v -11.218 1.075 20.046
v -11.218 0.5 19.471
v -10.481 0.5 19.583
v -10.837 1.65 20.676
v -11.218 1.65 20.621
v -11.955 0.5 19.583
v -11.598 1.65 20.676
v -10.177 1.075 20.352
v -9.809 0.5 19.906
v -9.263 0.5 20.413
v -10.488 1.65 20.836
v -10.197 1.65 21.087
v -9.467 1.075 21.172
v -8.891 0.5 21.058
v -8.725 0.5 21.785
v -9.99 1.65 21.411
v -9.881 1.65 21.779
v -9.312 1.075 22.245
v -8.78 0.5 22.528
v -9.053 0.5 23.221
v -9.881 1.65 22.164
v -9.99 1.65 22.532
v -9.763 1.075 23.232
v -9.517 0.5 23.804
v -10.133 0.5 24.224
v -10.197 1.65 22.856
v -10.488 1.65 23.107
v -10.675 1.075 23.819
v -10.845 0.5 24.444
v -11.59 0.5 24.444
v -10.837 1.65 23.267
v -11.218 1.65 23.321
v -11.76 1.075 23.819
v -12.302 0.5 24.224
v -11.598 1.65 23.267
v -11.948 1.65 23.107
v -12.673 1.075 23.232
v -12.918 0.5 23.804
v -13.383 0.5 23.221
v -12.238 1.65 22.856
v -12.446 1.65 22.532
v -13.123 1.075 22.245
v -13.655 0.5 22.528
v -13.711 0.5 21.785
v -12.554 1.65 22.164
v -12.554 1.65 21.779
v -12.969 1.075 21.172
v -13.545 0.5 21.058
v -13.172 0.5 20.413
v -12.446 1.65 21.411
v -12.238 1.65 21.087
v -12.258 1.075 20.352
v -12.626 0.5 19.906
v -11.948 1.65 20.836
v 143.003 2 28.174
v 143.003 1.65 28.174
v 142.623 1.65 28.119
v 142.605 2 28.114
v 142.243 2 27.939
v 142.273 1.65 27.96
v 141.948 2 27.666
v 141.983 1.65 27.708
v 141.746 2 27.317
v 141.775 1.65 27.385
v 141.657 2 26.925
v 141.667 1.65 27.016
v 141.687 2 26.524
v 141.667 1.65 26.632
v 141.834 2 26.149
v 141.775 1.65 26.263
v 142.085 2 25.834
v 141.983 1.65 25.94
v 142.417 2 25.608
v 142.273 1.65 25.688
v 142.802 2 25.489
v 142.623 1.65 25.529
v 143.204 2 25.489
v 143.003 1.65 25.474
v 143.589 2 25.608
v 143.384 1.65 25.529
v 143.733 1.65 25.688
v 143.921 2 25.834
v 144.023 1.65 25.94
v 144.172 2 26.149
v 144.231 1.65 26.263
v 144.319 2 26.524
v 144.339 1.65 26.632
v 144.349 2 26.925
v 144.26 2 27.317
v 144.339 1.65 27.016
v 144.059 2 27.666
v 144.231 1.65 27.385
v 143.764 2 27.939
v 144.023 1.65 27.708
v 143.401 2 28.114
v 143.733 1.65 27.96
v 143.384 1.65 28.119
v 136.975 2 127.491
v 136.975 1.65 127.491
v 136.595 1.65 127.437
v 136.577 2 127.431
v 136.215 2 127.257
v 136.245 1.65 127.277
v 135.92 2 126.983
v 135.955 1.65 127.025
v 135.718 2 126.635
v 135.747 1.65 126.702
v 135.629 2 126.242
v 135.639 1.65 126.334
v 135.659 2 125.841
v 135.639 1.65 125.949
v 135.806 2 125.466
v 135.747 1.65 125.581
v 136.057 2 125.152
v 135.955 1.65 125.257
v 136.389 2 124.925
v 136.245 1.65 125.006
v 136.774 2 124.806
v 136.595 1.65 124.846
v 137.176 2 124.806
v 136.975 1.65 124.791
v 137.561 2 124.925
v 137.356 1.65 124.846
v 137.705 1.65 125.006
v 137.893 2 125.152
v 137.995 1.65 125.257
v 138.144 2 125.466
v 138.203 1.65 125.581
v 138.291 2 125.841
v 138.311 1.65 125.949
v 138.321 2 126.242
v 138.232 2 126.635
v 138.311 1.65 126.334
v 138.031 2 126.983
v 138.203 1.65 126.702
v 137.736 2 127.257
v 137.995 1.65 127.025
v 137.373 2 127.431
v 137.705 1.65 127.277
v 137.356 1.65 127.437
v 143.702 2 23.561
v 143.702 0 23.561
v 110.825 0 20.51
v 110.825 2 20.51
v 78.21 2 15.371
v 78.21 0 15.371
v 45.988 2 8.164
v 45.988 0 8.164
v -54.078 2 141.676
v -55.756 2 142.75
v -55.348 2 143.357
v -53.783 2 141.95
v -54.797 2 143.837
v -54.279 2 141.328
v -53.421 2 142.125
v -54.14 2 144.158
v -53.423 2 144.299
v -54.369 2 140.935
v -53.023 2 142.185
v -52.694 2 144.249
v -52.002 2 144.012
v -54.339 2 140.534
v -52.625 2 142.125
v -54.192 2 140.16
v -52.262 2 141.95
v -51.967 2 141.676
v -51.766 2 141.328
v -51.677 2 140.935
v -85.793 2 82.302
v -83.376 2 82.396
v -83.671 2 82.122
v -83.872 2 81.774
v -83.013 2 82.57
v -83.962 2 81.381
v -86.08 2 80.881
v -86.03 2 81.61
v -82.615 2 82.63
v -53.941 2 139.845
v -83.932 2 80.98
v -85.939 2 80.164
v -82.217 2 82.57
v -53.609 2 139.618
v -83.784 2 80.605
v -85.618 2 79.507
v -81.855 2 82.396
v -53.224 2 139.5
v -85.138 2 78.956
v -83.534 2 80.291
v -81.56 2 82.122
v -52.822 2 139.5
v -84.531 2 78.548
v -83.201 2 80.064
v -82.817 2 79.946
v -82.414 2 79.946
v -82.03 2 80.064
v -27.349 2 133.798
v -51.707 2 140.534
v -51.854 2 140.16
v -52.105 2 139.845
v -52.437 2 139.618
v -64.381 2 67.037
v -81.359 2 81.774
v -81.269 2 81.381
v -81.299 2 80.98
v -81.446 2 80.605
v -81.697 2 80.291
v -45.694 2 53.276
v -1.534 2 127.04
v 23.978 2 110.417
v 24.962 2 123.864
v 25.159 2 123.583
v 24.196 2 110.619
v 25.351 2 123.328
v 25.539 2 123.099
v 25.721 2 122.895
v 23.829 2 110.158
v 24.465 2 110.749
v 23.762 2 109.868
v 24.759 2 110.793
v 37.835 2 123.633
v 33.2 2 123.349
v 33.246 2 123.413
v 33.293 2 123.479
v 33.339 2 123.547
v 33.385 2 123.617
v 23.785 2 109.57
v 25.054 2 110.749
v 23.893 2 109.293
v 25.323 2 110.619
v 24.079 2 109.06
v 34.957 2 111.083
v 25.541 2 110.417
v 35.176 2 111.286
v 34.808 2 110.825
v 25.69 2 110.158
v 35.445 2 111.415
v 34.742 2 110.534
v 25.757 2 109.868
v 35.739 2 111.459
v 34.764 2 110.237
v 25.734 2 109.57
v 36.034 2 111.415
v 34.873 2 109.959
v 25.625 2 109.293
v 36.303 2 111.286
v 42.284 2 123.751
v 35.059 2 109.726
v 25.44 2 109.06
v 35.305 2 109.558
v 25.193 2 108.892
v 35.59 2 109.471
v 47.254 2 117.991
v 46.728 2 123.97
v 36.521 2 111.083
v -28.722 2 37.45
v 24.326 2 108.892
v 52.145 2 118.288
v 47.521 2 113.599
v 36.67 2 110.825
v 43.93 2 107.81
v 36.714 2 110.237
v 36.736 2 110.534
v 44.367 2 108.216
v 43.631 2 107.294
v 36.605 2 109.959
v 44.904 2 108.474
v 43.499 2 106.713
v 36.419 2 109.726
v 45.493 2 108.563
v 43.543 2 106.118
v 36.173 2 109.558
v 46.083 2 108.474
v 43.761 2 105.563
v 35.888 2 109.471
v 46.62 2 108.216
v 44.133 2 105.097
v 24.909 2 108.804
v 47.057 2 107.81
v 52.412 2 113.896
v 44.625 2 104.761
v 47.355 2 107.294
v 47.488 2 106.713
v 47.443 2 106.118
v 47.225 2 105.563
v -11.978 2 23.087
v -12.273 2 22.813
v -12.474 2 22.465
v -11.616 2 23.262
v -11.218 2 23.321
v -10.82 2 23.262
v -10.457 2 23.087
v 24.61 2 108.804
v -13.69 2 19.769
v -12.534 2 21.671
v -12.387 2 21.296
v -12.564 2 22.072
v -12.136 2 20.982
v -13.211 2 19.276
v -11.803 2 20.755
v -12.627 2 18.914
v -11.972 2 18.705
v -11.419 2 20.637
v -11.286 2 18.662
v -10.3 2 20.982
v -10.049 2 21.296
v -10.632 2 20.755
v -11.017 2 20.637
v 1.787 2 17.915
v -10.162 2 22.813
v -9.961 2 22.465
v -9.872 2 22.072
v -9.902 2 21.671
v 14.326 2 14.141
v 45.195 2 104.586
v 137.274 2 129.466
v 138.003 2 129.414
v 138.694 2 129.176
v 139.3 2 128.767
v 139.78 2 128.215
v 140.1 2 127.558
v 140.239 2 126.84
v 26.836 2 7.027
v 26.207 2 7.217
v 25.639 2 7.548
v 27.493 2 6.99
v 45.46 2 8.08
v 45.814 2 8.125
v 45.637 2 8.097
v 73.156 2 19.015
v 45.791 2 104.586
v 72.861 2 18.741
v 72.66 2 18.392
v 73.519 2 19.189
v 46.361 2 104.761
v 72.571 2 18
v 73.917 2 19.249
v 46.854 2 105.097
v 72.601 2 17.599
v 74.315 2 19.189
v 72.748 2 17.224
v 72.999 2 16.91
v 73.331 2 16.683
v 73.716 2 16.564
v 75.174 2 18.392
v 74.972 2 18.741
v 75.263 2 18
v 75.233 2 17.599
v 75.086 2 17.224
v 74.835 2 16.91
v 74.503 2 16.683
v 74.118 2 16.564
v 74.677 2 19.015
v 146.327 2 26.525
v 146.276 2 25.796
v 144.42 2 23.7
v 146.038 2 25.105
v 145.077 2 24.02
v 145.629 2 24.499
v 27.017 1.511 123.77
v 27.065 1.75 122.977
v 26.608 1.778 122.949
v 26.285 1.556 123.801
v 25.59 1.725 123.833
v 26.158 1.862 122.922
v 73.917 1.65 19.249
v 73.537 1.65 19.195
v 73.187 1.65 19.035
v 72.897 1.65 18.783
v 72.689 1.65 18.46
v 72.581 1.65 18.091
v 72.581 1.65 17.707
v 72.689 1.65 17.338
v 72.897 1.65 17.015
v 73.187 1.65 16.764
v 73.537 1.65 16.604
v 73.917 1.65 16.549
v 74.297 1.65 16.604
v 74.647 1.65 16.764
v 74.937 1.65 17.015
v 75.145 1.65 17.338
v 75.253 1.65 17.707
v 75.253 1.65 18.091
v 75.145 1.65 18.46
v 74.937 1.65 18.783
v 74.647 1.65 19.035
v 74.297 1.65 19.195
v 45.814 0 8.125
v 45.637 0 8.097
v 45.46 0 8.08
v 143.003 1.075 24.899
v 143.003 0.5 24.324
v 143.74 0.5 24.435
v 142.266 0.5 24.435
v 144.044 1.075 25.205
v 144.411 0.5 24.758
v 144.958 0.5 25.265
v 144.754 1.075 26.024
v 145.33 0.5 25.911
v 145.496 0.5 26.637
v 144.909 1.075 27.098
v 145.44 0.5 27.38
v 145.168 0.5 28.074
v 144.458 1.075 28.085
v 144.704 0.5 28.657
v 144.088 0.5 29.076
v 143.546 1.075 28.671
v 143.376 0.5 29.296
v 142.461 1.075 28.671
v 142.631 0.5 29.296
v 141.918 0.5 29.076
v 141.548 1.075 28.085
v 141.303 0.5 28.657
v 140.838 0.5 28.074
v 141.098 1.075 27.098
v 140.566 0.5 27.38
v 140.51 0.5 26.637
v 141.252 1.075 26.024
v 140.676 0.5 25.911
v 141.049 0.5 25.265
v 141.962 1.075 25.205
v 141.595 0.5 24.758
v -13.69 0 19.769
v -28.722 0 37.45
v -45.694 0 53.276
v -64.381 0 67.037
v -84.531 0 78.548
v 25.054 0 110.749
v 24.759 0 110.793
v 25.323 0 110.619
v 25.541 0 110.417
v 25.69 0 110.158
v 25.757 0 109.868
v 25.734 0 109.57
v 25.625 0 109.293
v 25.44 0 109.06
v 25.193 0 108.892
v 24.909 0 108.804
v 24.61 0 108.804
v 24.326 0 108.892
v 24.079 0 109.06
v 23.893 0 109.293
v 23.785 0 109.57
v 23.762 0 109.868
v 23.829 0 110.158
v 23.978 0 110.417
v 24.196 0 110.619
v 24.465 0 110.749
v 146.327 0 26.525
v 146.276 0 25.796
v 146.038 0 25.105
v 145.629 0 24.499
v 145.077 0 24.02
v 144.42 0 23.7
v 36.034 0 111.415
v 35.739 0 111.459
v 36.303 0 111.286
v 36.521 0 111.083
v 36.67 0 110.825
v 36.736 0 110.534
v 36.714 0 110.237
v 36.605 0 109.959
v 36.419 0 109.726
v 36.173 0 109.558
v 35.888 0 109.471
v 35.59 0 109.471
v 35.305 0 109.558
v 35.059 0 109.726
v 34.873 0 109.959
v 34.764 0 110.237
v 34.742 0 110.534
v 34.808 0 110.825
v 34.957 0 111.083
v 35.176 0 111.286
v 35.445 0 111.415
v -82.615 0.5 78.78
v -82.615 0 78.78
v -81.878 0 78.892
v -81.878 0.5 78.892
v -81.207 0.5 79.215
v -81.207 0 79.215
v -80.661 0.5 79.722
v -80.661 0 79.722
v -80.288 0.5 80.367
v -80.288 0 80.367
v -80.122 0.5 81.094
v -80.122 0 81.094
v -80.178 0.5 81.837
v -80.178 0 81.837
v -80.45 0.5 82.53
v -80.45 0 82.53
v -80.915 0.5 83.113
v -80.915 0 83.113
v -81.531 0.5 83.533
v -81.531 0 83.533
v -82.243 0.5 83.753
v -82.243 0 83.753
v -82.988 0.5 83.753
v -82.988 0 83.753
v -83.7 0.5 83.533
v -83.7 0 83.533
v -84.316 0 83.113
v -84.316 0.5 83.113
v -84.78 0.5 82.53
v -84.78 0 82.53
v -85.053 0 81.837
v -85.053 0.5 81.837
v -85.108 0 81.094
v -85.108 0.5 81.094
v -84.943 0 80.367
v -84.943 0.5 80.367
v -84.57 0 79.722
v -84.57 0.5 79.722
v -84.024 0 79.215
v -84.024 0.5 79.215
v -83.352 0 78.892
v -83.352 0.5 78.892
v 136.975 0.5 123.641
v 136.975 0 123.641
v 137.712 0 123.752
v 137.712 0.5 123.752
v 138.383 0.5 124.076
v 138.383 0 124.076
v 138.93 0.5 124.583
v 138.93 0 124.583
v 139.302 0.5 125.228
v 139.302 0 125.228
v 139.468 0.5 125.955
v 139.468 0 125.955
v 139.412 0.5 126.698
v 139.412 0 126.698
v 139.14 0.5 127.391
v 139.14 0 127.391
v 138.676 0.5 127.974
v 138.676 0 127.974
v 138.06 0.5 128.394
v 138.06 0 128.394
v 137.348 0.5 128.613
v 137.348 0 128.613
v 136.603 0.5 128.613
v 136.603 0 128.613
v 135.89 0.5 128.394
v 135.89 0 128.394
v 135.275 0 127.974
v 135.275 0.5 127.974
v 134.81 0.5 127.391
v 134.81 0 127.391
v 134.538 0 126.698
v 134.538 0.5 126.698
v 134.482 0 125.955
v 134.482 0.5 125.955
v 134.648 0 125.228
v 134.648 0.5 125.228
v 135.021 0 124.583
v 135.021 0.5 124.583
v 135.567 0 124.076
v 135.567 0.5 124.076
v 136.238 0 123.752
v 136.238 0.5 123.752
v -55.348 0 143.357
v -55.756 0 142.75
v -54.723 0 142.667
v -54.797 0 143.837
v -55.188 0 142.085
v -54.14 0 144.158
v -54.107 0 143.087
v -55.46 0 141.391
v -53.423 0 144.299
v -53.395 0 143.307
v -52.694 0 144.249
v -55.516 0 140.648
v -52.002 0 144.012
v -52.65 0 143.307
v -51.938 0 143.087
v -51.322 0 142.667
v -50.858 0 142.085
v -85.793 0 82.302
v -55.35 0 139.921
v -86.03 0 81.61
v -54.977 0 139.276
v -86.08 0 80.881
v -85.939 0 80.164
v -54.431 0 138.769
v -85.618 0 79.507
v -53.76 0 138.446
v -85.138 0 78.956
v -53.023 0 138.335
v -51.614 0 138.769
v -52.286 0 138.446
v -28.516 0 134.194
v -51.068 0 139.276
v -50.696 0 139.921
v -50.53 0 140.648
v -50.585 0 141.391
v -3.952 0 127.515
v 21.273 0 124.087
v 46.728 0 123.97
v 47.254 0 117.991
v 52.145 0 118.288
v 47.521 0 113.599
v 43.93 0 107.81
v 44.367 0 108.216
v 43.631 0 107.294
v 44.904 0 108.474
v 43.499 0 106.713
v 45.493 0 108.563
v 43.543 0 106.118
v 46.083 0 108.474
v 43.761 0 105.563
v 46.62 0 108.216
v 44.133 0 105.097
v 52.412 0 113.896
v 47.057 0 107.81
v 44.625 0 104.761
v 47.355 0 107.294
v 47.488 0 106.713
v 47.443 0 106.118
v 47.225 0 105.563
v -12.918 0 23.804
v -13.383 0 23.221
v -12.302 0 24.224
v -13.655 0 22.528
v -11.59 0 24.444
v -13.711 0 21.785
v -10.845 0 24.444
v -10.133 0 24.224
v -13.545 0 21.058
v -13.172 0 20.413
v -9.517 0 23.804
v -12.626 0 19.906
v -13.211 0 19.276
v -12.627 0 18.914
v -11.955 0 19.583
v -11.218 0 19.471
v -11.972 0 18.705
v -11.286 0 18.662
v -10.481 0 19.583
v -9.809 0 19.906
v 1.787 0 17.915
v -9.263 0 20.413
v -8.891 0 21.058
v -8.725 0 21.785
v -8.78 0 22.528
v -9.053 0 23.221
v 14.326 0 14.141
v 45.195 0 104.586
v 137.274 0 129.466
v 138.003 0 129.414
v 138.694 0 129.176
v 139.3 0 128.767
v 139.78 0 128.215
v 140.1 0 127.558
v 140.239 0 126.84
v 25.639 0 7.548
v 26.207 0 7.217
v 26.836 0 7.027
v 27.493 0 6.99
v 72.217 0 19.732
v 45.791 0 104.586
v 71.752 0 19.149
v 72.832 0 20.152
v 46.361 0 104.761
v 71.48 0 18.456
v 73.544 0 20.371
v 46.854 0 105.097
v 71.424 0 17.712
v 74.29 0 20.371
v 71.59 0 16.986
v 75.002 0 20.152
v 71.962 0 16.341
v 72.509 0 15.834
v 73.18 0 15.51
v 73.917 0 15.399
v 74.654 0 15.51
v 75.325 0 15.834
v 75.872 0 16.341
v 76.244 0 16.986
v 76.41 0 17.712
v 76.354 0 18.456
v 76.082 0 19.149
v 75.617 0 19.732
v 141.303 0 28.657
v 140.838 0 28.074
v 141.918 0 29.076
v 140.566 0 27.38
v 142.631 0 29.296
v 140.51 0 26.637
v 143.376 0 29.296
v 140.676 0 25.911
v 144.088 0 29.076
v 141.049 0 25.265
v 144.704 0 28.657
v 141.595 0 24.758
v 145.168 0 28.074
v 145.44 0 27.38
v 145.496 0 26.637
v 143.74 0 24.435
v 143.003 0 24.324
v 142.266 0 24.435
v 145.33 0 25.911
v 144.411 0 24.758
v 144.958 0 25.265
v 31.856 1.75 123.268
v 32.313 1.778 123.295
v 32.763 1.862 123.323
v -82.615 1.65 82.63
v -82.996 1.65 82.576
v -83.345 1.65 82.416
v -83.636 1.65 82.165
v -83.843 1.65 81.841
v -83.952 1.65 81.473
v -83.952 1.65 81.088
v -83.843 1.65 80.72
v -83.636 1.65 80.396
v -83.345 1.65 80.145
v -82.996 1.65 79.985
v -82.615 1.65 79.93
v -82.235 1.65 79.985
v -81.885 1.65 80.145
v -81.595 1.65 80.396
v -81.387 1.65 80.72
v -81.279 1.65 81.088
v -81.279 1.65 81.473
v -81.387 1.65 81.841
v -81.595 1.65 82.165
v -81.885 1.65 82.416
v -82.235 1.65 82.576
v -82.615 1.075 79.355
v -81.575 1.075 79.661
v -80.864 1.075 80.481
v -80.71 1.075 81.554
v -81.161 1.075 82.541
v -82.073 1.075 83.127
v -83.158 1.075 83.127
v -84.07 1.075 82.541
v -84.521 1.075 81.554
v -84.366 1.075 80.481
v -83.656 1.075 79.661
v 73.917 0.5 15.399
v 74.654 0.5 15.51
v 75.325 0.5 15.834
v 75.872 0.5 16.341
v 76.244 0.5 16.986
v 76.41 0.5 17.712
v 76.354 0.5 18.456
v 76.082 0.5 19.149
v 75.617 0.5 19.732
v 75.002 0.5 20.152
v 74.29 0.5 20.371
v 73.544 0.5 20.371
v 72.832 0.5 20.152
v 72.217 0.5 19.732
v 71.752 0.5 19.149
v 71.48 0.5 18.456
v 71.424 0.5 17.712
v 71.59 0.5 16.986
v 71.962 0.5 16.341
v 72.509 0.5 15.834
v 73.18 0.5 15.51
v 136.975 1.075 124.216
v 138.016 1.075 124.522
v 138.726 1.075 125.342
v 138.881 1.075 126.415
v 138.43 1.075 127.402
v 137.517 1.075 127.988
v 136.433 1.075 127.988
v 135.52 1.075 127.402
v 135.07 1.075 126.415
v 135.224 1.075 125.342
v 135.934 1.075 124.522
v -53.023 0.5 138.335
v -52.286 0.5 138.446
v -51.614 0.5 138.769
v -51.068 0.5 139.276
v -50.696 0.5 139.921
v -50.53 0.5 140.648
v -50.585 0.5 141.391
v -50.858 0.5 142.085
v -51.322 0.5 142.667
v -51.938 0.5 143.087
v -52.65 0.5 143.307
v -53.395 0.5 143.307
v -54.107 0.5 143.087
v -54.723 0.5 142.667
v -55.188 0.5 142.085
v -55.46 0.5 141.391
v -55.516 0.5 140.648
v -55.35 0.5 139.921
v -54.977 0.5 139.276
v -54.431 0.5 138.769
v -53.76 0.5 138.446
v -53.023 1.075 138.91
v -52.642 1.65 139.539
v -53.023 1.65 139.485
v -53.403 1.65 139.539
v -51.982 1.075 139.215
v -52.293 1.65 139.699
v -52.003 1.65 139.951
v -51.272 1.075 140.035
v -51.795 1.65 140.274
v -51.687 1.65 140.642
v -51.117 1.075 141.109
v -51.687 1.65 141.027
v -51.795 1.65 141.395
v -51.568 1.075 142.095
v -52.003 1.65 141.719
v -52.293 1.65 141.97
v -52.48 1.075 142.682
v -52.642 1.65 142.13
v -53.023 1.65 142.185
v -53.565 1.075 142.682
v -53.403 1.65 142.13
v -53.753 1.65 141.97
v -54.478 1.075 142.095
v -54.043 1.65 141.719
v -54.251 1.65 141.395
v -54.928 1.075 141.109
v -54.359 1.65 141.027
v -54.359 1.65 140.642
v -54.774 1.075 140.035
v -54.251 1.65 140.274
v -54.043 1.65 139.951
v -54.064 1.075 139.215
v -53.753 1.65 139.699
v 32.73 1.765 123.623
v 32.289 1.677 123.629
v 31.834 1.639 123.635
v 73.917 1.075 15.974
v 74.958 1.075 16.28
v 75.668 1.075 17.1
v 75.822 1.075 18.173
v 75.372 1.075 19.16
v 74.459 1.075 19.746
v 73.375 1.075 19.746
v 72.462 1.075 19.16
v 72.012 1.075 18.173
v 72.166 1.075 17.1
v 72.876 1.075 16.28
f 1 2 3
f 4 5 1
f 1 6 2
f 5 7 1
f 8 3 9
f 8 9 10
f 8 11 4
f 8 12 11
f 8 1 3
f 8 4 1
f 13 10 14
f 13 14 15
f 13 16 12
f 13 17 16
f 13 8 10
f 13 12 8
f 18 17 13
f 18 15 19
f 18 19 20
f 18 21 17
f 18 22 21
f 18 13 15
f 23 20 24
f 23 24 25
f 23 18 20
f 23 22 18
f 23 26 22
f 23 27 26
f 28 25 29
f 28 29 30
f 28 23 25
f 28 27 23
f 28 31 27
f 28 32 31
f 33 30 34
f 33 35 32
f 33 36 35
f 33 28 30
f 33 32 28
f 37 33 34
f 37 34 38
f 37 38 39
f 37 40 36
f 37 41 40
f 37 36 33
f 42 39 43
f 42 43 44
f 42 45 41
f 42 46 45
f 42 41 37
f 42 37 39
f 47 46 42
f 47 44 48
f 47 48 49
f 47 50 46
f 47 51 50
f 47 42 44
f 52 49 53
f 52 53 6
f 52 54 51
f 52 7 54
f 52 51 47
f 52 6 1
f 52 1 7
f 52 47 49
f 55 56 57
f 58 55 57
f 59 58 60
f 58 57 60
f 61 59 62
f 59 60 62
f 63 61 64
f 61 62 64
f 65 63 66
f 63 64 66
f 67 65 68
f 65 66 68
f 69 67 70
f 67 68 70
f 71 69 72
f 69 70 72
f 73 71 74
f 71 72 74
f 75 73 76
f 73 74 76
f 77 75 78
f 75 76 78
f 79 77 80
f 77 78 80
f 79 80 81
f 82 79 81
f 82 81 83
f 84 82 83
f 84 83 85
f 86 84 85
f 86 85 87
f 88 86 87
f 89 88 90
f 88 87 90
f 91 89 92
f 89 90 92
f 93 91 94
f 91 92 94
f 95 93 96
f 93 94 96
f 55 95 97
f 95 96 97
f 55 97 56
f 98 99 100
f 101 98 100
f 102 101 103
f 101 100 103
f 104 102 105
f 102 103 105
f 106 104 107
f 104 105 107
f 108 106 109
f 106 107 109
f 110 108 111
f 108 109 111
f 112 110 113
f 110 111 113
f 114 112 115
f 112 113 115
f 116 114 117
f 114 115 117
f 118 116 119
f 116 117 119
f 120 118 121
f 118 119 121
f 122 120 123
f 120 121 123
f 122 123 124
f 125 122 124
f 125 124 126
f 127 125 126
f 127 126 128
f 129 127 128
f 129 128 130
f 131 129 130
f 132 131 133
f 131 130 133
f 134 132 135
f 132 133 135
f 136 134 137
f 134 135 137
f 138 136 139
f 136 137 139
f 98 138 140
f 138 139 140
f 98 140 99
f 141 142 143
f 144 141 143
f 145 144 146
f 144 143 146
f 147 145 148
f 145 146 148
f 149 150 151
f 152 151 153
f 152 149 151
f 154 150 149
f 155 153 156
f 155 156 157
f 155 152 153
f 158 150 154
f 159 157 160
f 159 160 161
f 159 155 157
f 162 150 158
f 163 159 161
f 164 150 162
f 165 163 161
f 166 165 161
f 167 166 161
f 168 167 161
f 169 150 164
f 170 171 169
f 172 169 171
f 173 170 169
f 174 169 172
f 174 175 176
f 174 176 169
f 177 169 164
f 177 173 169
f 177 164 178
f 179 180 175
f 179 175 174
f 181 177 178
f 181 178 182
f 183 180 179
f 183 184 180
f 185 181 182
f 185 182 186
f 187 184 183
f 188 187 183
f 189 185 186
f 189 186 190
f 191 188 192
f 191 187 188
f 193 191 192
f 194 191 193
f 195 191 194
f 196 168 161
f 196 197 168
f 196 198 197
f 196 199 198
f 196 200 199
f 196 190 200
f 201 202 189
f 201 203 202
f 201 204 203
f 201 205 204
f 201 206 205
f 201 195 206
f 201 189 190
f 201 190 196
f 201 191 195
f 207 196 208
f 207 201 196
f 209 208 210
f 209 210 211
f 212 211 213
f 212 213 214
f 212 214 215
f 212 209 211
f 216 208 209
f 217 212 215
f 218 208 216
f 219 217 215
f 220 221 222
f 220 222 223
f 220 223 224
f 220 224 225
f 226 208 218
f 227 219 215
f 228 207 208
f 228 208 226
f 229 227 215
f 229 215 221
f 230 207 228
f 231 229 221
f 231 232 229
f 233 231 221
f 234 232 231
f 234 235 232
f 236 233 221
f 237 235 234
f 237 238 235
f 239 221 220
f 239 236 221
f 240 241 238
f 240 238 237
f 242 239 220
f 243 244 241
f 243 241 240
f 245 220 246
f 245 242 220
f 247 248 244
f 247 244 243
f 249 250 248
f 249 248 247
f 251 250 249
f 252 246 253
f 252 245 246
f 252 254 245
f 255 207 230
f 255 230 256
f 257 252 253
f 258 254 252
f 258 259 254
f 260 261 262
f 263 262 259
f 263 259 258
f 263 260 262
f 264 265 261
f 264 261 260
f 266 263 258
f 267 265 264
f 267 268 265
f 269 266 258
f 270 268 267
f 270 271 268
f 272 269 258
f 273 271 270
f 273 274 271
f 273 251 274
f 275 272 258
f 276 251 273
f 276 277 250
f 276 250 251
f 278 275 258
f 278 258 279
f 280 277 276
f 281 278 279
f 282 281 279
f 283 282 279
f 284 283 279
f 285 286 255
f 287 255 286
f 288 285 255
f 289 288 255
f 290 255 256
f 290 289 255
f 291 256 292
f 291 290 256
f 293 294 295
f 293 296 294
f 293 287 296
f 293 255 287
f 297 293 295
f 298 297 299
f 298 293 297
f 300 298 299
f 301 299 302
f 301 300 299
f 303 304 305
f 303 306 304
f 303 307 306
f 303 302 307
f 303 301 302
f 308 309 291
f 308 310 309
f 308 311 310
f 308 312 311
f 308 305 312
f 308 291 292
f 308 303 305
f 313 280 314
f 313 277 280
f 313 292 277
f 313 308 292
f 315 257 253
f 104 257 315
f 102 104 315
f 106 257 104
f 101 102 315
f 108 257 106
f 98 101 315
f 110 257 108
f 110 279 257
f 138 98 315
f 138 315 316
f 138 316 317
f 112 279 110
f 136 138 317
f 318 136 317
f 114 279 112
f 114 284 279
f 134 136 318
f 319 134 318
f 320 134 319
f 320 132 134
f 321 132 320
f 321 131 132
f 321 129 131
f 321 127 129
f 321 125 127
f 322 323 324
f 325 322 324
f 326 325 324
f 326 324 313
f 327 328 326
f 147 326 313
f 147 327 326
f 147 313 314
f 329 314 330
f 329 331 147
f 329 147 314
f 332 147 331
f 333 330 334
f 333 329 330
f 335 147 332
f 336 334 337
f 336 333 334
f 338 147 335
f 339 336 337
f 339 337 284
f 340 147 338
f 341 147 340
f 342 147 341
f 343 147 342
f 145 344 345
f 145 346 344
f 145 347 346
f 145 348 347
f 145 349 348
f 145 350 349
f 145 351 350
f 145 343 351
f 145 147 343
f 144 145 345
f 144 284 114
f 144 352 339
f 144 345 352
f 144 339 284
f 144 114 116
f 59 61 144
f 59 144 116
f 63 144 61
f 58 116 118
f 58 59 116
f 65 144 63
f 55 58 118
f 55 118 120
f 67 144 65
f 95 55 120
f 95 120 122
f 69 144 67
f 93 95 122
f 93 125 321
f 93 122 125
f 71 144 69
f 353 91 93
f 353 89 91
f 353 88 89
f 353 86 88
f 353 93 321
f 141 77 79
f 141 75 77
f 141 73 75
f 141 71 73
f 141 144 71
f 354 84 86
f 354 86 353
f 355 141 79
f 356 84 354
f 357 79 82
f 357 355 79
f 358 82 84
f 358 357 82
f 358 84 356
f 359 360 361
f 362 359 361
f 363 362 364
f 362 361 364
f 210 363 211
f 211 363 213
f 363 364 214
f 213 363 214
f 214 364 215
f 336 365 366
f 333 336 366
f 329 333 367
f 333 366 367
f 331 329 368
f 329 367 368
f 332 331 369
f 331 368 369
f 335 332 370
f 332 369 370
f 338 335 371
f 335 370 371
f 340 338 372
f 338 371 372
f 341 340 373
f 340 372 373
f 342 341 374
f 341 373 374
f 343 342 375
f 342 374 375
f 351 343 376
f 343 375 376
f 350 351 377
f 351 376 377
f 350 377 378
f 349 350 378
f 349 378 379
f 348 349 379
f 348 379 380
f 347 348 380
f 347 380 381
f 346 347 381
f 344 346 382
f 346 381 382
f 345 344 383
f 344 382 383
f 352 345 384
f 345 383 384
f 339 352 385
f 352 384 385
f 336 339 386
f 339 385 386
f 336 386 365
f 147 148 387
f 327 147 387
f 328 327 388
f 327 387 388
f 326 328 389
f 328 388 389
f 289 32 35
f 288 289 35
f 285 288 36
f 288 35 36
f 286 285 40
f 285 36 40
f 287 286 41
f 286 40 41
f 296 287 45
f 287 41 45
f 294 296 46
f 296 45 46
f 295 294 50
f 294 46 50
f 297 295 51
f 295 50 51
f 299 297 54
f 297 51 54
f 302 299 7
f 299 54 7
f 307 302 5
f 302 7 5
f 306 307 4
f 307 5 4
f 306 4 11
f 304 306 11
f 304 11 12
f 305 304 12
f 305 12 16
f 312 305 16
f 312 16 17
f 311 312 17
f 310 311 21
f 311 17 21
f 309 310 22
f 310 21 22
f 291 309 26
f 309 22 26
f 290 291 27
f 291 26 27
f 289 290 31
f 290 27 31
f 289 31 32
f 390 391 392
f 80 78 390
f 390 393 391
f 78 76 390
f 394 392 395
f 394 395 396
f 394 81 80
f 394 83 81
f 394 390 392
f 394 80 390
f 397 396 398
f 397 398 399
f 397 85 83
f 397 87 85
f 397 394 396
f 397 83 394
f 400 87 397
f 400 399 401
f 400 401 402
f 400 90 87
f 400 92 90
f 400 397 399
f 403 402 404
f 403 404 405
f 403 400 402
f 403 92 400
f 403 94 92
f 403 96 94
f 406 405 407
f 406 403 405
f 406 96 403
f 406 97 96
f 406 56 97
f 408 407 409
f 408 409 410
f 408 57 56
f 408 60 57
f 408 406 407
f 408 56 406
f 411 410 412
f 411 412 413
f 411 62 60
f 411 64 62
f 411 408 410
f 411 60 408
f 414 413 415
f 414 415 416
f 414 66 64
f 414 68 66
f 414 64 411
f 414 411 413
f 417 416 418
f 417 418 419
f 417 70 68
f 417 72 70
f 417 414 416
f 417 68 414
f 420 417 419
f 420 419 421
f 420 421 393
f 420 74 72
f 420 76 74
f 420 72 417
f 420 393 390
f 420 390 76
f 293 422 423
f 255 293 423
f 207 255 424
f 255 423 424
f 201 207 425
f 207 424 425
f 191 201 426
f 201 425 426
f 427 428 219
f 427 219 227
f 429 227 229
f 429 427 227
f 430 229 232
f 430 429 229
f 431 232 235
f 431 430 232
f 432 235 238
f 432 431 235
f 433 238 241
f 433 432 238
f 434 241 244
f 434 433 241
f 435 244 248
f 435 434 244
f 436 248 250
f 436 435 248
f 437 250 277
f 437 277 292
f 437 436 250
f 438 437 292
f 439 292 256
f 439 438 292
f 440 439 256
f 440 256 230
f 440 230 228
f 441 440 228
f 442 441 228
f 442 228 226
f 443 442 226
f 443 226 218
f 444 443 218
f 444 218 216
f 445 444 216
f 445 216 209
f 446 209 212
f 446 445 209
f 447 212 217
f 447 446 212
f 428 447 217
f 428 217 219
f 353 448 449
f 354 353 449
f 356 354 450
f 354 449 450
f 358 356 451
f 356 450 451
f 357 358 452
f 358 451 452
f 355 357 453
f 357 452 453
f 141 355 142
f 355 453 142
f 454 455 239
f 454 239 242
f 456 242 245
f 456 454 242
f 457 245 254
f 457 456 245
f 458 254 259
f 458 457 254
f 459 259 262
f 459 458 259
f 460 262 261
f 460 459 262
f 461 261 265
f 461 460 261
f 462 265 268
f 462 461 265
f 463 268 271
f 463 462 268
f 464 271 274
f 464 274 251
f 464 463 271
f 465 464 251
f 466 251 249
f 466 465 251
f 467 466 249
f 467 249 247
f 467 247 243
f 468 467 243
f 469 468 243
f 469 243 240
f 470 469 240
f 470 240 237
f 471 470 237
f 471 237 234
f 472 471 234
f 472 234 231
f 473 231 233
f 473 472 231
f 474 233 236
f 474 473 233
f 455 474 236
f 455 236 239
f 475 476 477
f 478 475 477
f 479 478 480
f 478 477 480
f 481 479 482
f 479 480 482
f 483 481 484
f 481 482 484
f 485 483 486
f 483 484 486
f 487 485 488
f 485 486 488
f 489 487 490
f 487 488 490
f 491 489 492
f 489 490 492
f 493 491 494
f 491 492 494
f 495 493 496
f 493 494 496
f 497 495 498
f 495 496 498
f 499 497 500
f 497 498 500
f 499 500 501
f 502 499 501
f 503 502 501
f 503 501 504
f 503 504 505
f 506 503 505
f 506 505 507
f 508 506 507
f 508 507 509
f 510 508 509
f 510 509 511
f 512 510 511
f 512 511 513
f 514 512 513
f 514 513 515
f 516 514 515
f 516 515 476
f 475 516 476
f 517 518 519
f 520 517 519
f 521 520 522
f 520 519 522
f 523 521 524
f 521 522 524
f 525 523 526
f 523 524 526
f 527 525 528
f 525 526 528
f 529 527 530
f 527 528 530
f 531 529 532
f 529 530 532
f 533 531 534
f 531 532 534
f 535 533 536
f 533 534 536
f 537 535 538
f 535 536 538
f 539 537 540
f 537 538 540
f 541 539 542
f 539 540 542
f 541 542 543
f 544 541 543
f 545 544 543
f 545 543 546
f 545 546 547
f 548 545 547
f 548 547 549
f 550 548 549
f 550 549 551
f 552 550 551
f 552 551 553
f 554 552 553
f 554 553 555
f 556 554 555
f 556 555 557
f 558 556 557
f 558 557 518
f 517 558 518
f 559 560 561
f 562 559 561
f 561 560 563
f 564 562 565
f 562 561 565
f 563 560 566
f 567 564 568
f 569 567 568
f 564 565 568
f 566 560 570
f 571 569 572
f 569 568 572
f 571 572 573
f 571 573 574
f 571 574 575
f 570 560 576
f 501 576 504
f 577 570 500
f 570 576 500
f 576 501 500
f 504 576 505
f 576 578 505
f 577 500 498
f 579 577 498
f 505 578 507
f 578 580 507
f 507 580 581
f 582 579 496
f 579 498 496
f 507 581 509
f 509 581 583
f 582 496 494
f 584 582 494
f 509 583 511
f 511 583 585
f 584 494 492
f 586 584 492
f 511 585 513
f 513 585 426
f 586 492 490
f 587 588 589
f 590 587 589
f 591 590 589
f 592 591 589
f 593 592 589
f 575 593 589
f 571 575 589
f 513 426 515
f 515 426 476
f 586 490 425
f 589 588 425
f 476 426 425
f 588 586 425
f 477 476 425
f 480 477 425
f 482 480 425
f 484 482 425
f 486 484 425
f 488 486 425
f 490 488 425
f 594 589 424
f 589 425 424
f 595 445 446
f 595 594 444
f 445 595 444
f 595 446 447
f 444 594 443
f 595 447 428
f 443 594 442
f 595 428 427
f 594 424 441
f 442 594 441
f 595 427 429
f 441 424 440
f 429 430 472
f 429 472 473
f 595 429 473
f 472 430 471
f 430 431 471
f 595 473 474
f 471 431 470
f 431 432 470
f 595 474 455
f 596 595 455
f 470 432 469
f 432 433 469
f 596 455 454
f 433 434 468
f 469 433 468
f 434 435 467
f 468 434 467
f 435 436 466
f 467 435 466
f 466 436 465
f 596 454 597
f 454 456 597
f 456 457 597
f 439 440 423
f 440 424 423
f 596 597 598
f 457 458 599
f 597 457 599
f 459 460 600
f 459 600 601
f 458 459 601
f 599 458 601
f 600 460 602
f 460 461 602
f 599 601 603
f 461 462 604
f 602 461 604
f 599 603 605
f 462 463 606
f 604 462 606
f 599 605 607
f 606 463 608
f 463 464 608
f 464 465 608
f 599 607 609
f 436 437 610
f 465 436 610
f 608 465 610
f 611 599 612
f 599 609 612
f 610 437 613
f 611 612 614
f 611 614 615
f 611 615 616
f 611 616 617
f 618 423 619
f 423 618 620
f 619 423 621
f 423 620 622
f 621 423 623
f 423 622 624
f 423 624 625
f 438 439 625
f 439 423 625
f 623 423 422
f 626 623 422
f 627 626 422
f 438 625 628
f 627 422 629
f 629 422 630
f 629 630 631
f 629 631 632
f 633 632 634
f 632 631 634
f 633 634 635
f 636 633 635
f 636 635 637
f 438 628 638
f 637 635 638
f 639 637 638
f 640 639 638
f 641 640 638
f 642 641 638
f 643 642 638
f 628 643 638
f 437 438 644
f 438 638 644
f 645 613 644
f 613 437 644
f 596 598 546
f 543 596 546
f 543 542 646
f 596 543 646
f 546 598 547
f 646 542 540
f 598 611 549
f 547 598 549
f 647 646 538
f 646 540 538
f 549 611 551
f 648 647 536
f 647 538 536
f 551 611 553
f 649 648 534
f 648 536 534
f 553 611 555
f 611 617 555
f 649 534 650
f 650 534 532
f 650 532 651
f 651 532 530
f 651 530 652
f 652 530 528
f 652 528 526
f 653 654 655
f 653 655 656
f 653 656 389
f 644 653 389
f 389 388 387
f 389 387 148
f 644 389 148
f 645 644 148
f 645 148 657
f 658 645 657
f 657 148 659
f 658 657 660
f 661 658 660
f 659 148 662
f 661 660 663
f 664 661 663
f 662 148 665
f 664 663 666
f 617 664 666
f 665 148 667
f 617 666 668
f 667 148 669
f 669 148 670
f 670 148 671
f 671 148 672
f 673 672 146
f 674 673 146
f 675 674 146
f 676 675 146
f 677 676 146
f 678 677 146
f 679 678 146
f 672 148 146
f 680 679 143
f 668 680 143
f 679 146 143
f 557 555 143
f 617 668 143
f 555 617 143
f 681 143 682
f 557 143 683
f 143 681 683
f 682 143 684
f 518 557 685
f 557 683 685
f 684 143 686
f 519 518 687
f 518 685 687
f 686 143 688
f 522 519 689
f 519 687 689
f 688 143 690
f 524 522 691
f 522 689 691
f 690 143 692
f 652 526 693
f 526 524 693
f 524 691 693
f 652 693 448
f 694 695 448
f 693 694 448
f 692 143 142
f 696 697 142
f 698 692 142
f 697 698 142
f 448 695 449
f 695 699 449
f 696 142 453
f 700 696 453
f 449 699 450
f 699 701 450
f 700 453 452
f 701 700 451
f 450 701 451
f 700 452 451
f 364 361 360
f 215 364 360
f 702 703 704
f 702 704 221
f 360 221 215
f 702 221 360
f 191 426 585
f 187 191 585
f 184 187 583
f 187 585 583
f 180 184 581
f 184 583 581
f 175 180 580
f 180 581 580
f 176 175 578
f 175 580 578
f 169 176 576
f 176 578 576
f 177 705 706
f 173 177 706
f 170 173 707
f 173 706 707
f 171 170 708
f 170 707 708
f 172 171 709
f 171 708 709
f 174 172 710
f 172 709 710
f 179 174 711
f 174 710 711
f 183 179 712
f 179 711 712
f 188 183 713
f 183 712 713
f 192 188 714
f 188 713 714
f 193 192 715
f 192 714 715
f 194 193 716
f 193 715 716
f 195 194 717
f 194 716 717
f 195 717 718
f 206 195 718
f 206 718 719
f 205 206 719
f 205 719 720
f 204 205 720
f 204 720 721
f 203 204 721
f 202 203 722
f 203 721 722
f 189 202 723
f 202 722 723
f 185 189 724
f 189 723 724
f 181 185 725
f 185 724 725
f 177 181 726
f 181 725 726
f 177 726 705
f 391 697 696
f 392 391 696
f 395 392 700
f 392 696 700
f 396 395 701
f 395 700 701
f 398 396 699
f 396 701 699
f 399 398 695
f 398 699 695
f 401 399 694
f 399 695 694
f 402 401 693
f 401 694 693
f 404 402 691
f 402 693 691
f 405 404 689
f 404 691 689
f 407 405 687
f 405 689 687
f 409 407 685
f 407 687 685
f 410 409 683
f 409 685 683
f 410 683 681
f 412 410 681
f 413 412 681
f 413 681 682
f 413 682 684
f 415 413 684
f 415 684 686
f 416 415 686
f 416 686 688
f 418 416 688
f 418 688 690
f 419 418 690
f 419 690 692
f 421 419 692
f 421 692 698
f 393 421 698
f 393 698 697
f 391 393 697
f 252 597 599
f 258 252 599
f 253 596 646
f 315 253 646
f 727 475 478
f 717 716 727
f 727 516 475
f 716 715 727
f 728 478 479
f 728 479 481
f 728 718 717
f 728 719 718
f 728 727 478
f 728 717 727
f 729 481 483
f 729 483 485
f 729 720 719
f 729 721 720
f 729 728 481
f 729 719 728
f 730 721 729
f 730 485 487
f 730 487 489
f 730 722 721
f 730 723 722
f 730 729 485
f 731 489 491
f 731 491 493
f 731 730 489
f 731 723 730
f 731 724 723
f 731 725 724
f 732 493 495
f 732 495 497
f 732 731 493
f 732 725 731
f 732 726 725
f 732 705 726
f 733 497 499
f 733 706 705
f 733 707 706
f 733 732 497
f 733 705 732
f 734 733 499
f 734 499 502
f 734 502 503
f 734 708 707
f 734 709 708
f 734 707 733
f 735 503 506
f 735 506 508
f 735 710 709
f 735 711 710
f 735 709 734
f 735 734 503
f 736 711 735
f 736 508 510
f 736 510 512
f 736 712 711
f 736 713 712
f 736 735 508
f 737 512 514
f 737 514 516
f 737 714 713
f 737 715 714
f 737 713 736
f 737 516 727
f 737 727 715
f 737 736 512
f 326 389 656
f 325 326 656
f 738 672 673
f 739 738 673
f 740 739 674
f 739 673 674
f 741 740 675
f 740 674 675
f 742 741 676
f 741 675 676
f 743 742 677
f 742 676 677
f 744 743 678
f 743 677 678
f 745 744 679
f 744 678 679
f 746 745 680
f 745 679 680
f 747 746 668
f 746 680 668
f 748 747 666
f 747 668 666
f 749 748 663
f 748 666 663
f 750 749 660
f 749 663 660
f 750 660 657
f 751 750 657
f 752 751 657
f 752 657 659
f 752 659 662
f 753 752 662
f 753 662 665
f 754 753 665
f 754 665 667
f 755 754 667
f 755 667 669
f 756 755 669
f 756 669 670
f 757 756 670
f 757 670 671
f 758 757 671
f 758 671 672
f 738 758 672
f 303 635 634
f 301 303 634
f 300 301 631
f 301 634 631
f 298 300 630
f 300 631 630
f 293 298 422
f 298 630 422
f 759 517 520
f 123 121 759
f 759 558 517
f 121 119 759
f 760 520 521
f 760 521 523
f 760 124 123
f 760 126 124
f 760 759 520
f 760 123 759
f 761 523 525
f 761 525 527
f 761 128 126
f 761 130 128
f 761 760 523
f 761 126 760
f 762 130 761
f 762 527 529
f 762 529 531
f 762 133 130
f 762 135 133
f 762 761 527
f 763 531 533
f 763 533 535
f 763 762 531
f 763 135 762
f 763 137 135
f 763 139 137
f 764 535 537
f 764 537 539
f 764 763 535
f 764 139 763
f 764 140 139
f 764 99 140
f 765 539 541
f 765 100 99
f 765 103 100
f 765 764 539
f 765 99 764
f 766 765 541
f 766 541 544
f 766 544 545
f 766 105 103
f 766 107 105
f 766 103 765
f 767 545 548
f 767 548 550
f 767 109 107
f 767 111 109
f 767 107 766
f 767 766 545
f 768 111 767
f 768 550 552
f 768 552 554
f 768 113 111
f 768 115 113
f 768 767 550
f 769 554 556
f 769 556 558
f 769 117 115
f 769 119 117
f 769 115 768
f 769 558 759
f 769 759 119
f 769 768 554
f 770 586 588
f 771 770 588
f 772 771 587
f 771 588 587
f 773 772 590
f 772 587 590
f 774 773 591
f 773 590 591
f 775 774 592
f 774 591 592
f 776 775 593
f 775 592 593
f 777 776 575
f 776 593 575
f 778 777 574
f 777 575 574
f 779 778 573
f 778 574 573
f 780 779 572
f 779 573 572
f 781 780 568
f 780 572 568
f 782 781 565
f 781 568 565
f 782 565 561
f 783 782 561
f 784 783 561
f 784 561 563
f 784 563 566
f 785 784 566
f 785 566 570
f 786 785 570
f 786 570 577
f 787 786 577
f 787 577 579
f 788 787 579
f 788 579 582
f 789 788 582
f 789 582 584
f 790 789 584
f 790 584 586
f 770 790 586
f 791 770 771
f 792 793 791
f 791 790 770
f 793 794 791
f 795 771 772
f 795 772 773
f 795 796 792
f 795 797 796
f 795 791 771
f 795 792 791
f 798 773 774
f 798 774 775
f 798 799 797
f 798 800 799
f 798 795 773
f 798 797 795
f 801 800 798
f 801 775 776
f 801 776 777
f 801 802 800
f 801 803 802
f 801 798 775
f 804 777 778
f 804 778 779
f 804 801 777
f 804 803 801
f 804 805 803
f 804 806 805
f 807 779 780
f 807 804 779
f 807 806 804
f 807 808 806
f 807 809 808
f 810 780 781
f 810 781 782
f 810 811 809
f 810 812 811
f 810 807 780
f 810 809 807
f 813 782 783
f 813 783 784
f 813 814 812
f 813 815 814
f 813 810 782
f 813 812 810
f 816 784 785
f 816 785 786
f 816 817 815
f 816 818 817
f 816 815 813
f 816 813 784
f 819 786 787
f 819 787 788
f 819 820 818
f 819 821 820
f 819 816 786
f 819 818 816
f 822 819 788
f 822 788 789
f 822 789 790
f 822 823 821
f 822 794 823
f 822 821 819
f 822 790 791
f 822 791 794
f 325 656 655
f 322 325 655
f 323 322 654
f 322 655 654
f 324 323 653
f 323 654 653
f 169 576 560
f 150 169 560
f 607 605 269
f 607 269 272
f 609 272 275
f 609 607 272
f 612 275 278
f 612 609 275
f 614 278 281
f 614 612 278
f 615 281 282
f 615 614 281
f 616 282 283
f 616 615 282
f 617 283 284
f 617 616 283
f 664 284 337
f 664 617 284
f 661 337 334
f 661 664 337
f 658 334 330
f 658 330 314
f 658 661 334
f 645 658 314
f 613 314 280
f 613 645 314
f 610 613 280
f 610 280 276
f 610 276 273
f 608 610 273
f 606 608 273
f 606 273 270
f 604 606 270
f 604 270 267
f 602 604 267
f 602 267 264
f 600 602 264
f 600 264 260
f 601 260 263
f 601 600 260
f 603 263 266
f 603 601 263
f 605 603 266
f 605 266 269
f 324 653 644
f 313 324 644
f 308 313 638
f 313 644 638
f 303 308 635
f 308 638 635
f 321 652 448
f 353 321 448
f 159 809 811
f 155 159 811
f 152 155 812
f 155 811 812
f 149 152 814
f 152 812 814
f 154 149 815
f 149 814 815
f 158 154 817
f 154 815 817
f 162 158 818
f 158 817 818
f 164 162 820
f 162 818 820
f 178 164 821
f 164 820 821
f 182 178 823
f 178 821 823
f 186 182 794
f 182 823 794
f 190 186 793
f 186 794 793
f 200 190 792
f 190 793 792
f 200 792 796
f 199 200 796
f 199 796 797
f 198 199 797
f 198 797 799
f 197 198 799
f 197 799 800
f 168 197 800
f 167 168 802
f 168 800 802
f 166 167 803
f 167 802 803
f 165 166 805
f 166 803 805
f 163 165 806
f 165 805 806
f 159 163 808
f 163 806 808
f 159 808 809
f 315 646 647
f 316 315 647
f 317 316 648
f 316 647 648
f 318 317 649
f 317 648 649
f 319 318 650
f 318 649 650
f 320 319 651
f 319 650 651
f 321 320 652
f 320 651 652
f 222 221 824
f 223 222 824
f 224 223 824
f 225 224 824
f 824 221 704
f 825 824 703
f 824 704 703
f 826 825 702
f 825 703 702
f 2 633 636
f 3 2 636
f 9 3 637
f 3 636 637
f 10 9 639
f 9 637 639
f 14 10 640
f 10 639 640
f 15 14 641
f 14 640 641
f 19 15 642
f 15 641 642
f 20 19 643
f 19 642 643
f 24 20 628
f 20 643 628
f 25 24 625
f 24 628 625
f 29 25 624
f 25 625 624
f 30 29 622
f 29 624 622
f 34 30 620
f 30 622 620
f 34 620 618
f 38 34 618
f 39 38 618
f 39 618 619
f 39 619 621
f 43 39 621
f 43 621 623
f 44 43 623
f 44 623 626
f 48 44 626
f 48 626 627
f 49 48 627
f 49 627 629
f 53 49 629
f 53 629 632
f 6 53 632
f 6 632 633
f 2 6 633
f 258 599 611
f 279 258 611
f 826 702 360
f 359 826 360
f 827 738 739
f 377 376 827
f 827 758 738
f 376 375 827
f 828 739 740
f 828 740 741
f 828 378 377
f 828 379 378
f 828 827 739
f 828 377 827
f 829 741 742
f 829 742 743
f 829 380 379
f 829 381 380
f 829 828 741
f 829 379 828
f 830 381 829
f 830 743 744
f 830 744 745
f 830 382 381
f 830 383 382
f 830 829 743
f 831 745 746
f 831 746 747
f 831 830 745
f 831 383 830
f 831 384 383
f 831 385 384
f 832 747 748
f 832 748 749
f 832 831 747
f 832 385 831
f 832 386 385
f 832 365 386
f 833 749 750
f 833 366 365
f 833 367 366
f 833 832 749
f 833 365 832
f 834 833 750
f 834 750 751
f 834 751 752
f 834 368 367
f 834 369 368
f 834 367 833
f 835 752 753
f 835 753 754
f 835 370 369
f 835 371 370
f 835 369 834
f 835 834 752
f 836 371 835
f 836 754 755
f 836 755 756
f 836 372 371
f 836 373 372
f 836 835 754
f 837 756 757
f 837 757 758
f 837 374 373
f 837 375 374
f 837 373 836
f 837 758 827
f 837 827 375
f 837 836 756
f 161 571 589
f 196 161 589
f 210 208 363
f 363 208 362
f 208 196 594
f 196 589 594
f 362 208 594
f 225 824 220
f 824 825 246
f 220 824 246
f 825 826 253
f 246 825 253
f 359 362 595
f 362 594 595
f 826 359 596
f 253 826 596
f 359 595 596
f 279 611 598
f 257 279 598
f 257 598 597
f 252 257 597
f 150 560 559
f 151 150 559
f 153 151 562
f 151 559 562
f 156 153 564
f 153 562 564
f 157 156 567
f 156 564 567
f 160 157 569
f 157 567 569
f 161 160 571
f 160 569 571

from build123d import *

# Parameters (mm, degrees)
SKETCH1_R                = 1
SKETCH1_R_2              = 2
SKETCH1_R_3              = 1.35
MAIN_PLATE_DEPTH         = 2
SKETCH2_R                = 2.5
SCREW_HOLES_DEPTH        = 1.7
SCREW_HOLES_CHAMFER_SIZE = 1.2


with BuildPart() as part:
    # Sketch1 → Main_plate (new body)
    with BuildSketch(Plane(origin=(0, 0, 0), x_dir=(1, 0, 0), z_dir=(0, 1, 0))):
        with BuildLine():
            Line((-85.7928409, -82.301697444), (-55.755812757, -142.75024532))
            ThreePointArc((-55.755812757, -142.75024532), (-54.140343173, -144.158373046), (-52.002337011, -144.011760212))
            ThreePointArc((-52.002337011, -144.011760212), (-3.951682628, -127.514559525), (46.728283967, -123.969985789))
            Line((46.728283967, -123.969985789), (137.274321343, -129.465618584))
            ThreePointArc((137.274321343, -129.465618584), (139.300267663, -128.766971907), (140.238810242, -126.840393723))
            Line((140.238810242, -126.840393723), (146.327388064, -26.524995005))
            ThreePointArc((146.327388064, -26.524995005), (145.628741387, -24.499048684), (143.702163203, -23.560506106))
            ThreePointArc((143.702163203, -23.560506106), (94.476527457, -18.20079206), (45.987943487, -8.163512858))
            ThreePointArc((45.987943487, -8.163512858), (45.725737799, -8.109235511), (45.459546448, -8.080252452))
            Line((45.459546448, -8.080252452), (27.492609364, -6.989760902))
            ThreePointArc((27.492609364, -6.989760902), (26.515953382, -7.103440368), (25.638814565, -7.547745919))
            ThreePointArc((25.638814565, -7.547745919), (8.167641381, -16.397587105), (-11.285751241, -18.661896472))
            ThreePointArc((-11.285751241, -18.661896472), (-12.626973233, -18.913649552), (-13.689904343, -19.76947284))
            ThreePointArc((-13.689904343, -19.76947284), (-45.694454746, -53.276077835), (-84.531326007, -78.548221698))
            ThreePointArc((-84.531326007, -78.548221698), (-85.939453733, -80.163691282), (-85.7928409, -82.301697444))
        make_face()
        with Locations(Location((24.759473712, -109.793011675, 0), (0, 0, 270))):
            Circle(SKETCH1_R, mode=Mode.SUBTRACT)
        with Locations(Location((35.739268597, -110.459423178, 0), (0, 0, 270))):
            Circle(SKETCH1_R, mode=Mode.SUBTRACT)
        with Locations(Location((45.493229955, -106.563189377, 0), (0, 0, 270))):
            Circle(SKETCH1_R_2, mode=Mode.SUBTRACT)
        with Locations(Location((143.003172699, -26.823913699, 0), (0, 0, 270))):
            Circle(SKETCH1_R_3, mode=Mode.SUBTRACT)
        with Locations(Location((73.916954773, -17.899251104, 0), (0, 0, 270))):
            Circle(SKETCH1_R_3, mode=Mode.SUBTRACT)
        with Locations(Location((-11.217743895, -21.971485999, 0), (0, 0, 270))):
            Circle(SKETCH1_R_3, mode=Mode.SUBTRACT)
        with Locations(Location((-82.615354782, -81.280438678, 0), (0, 0, 270))):
            Circle(SKETCH1_R_3, mode=Mode.SUBTRACT)
        with Locations(Location((-53.022766816, -140.834565069, 0), (0, 0, 270))):
            Circle(SKETCH1_R_3, mode=Mode.SUBTRACT)
        with Locations(Location((136.975163208, -126.141388687, 0), (0, 0, 270))):
            Circle(SKETCH1_R_3, mode=Mode.SUBTRACT)
        Polygon((47.520707964, -113.598943276), (52.411707503, -113.895799309), (52.145142902, -118.287717263), (47.254143363, -117.99086123), align=None, mode=Mode.SUBTRACT)
    extrude(amount=MAIN_PLATE_DEPTH)

    # Sketch2 → Screw_holes (cut)
    with BuildSketch(Plane.XZ):
        with Locations(Location((136.975163208, 126.141388687, 0), (0, 0, 270))):
            Circle(SKETCH2_R)
        with Locations(Location((-53.022766816, 140.834565069, 0), (0, 0, 270))):
            Circle(SKETCH2_R)
        with Locations(Location((-82.615354782, 81.280438678, 0), (0, 0, 270))):
            Circle(SKETCH2_R)
        with Locations(Location((-11.217743895, 21.971485999, 0), (0, 0, 270))):
            Circle(SKETCH2_R)
        with Locations(Location((73.916954773, 17.899251104, 0), (0, 0, 270))):
            Circle(SKETCH2_R)
        with Locations(Location((143.003172699, 26.823913699, 0), (0, 0, 270))):
            Circle(SKETCH2_R)
    extrude(amount=-SCREW_HOLES_DEPTH, mode=Mode.SUBTRACT)

    # Screw_holes_chamfer
    # the kernel refuses this chamfer: 1.2 mm, written as the material it adds along each edge
    with BuildSketch(Plane(origin=(143.003172699, 1.7, 26.823913699), x_dir=(0, 0, -1), z_dir=(-1, 0, 0))) as screw_holes_chamfer_piece_1_section:
        Polygon((2.5, SCREW_HOLES_CHAMFER_SIZE), (2.5 - SCREW_HOLES_CHAMFER_SIZE, 0), (2.5, 0), align=None)
    screw_holes_chamfer_piece_1 = revolve(axis=Axis((143.003172699, 1.7, 26.823913699), (0, -1, 0)), mode=Mode.PRIVATE)
    screw_holes_chamfer_piece_1 = screw_holes_chamfer_piece_1 - Plane(origin=(143.003172699, 1.073479929, 26.823913699), x_dir=(0, 0, 1), z_dir=(0, -1, 0)) * Cylinder(1.35, 10, mode=Mode.PRIVATE)
    add(screw_holes_chamfer_piece_1)
    with BuildSketch(Plane(origin=(73.916954773, 1.7, 17.899251104), x_dir=(0, 0, -1), z_dir=(-1, 0, 0))) as screw_holes_chamfer_piece_2_section:
        Polygon((2.5, SCREW_HOLES_CHAMFER_SIZE), (2.5 - SCREW_HOLES_CHAMFER_SIZE, 0), (2.5, 0), align=None)
    screw_holes_chamfer_piece_2 = revolve(axis=Axis((73.916954773, 1.7, 17.899251104), (0, -1, 0)), mode=Mode.PRIVATE)
    screw_holes_chamfer_piece_2 = screw_holes_chamfer_piece_2 - Plane(origin=(73.916954773, 1.073479929, 17.899251104), x_dir=(0, 0, 1), z_dir=(0, -1, 0)) * Cylinder(1.35, 10, mode=Mode.PRIVATE)
    add(screw_holes_chamfer_piece_2)
    with BuildSketch(Plane(origin=(-11.217743895, 1.7, 21.971485999), x_dir=(0, 0, -1), z_dir=(-1, 0, 0))) as screw_holes_chamfer_piece_3_section:
        Polygon((2.5, SCREW_HOLES_CHAMFER_SIZE), (2.5 - SCREW_HOLES_CHAMFER_SIZE, 0), (2.5, 0), align=None)
    screw_holes_chamfer_piece_3 = revolve(axis=Axis((-11.217743895, 1.7, 21.971485999), (0, -1, 0)), mode=Mode.PRIVATE)
    screw_holes_chamfer_piece_3 = screw_holes_chamfer_piece_3 - Plane(origin=(-11.217743895, 1.073479929, 21.971485999), x_dir=(0, 0, 1), z_dir=(0, -1, 0)) * Cylinder(1.35, 10, mode=Mode.PRIVATE)
    add(screw_holes_chamfer_piece_3)
    with BuildSketch(Plane(origin=(-82.615354782, 1.7, 81.280438678), x_dir=(0, 0, -1), z_dir=(-1, 0, 0))) as screw_holes_chamfer_piece_4_section:
        Polygon((2.5, SCREW_HOLES_CHAMFER_SIZE), (2.5 - SCREW_HOLES_CHAMFER_SIZE, 0), (2.5, 0), align=None)
    screw_holes_chamfer_piece_4 = revolve(axis=Axis((-82.615354782, 1.7, 81.280438678), (0, -1, 0)), mode=Mode.PRIVATE)
    screw_holes_chamfer_piece_4 = screw_holes_chamfer_piece_4 - Plane(origin=(-82.615354782, 1.073479929, 81.280438678), x_dir=(0, 0, 1), z_dir=(0, -1, 0)) * Cylinder(1.35, 11, mode=Mode.PRIVATE)
    add(screw_holes_chamfer_piece_4)
    with BuildSketch(Plane(origin=(-53.022766816, 1.7, 140.834565069), x_dir=(0, 0, -1), z_dir=(-1, 0, 0))) as screw_holes_chamfer_piece_5_section:
        Polygon((2.5, SCREW_HOLES_CHAMFER_SIZE), (2.5 - SCREW_HOLES_CHAMFER_SIZE, 0), (2.5, 0), align=None)
    screw_holes_chamfer_piece_5 = revolve(axis=Axis((-53.022766816, 1.7, 140.834565069), (0, -1, 0)), mode=Mode.PRIVATE)
    screw_holes_chamfer_piece_5 = screw_holes_chamfer_piece_5 - Plane(origin=(-53.022766816, 1.073479929, 140.834565069), x_dir=(0, 0, 1), z_dir=(0, -1, 0)) * Cylinder(1.35, 10, mode=Mode.PRIVATE)
    add(screw_holes_chamfer_piece_5)
    with BuildSketch(Plane(origin=(136.975163208, 1.7, 126.141388687), x_dir=(0, 0, -1), z_dir=(-1, 0, 0))) as screw_holes_chamfer_piece_6_section:
        Polygon((2.5, SCREW_HOLES_CHAMFER_SIZE), (2.5 - SCREW_HOLES_CHAMFER_SIZE, 0), (2.5, 0), align=None)
    screw_holes_chamfer_piece_6 = revolve(axis=Axis((136.975163208, 1.7, 126.141388687), (0, -1, 0)), mode=Mode.PRIVATE)
    screw_holes_chamfer_piece_6 = screw_holes_chamfer_piece_6 - Plane(origin=(136.975163208, 1.073479929, 126.141388687), x_dir=(0, 0, 1), z_dir=(0, -1, 0)) * Cylinder(1.35, 10, mode=Mode.PRIVATE)
    add(screw_holes_chamfer_piece_6)

    # Sketch4 → Cut-Loft1 section 0
    with BuildSketch(Plane(origin=(-7.640186202, 0, 125.879695971), x_dir=(0.9981631713309721, 0, 0.060582863901407005), z_dir=(-0.060582863901407005, 0, 0.9981631713309721))):
        with BuildLine():
            Line((34.465569885, 10.749979768), (39.265569885, 10.749979768))
            ThreePointArc((39.265569885, 10.749979768), (44.515569885, 5.499979768), (39.265569885, 0.249979768))
            Line((39.265569885, 0.249979768), (34.465569885, 0.249979768))
            ThreePointArc((34.465569885, 0.249979768), (29.215569885, 5.499979768), (34.465569885, 10.749979768))
        make_face()
    # Sketch3 → Cut-Loft1 section 1
    with BuildSketch(Plane(origin=(-7.337271882, 0, 120.888880114), x_dir=(0.9981631713309721, 0, 0.060582863901407005), z_dir=(-0.060582863901407005, 0, 0.9981631713309721))):
        with BuildLine():
            Line((34.465569885, 9.25), (39.265569885, 9.25))
            ThreePointArc((39.265569885, 9.25), (43.015590117, 5.499979768), (39.265569885, 1.749959536))
            Line((39.265569885, 1.749959536), (34.465569885, 1.749959536))
            ThreePointArc((34.465569885, 1.749959536), (30.715549653, 5.499979768), (34.465569885, 9.25))
        make_face()
    loft(mode=Mode.SUBTRACT)


solid = part.part
